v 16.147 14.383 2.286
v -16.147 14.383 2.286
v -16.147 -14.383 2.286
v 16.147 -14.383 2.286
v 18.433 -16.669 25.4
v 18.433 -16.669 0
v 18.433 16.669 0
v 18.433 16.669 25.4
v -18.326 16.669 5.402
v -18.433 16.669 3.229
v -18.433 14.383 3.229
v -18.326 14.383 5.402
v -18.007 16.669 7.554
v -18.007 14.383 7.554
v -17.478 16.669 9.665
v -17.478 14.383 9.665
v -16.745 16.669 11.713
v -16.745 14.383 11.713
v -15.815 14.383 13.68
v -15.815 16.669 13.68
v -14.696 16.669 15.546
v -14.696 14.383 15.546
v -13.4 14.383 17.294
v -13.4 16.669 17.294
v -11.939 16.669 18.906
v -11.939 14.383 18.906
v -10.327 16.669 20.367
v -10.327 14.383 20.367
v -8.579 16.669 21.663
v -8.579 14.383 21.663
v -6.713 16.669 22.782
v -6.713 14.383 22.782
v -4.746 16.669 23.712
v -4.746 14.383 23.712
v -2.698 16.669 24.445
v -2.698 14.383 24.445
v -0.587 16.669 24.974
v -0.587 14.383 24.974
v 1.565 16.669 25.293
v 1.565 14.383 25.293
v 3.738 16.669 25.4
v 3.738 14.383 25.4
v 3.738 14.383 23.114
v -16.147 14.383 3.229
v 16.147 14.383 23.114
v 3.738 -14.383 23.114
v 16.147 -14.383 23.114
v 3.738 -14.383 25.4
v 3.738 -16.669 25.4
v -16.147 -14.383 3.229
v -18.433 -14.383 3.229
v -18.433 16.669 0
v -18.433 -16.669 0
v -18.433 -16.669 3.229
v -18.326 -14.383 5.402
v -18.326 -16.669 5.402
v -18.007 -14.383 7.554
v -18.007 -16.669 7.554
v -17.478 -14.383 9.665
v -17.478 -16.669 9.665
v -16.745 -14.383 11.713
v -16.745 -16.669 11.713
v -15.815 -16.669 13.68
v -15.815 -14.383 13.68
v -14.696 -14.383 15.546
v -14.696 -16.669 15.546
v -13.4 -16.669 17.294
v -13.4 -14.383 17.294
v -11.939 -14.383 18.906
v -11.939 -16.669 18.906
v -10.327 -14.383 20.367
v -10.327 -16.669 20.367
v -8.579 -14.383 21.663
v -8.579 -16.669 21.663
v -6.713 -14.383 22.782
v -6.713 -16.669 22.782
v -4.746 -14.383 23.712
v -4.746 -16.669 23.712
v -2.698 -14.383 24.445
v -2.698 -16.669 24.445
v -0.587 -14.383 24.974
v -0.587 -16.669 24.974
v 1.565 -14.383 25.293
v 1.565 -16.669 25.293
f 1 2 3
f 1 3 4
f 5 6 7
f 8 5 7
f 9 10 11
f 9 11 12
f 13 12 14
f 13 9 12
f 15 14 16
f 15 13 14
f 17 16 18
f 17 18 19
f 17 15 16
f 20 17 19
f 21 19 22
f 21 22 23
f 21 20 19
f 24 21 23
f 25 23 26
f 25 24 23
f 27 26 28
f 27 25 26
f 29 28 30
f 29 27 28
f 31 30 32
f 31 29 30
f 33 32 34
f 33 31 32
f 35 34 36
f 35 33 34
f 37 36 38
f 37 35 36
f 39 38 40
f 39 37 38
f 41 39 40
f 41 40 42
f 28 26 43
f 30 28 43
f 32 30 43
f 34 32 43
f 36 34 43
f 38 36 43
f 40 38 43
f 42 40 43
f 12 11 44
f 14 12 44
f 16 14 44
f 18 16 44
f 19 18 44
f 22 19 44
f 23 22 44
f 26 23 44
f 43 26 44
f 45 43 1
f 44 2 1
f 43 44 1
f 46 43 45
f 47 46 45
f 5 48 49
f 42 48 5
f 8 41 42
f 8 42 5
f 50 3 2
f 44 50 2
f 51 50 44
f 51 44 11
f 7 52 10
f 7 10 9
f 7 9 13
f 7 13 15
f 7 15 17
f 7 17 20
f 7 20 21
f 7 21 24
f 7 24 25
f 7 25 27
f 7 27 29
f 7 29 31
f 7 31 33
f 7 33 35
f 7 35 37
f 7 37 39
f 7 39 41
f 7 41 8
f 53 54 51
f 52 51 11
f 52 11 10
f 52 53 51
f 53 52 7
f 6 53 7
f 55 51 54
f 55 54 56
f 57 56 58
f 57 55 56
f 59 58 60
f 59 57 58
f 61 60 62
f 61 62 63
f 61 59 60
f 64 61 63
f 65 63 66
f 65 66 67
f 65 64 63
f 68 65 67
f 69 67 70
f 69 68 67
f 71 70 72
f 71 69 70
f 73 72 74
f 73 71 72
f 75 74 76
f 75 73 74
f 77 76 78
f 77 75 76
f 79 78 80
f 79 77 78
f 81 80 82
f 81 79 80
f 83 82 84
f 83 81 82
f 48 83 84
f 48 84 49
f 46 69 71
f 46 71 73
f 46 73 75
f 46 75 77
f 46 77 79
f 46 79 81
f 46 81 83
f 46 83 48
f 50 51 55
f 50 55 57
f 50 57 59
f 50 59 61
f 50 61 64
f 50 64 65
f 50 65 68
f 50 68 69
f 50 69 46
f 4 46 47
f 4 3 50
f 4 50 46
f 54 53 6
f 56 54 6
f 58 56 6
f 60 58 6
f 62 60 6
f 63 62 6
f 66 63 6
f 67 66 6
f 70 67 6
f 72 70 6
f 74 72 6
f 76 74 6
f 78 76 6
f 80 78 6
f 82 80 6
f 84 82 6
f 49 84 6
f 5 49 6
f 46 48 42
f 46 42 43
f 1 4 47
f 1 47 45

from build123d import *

# Parameters (mm, degrees)
F0_W     = 36.8659496307
F0_H     = 33.33741799
F1_DEPTH = 25.4
F2_R     = 22.1712758518
F3_T     = 2.286


# Not quite as in the source:
# - a shell that OpenCascade refuses in one call is made with other operations: the cavity is built on its own and cut out


with BuildPart() as f1:
    # F0 (on Top) → F1 (new body)
    with BuildSketch(Plane.XY):
        Rectangle(F0_W, F0_H)
    extrude(amount=F1_DEPTH)

    # F2
    f2_edges = [f1.edges().sort_by_distance(p)[0] for p in [
        (-18.432975, 0, 25.4),
    ]]
    fillet(f2_edges, radius=F2_R)

    # F3: shell of thickness 2.286, made by hand


with BuildPart() as f3_core1:
    # F3_t2: copy of F1
    add(f1.part)

    # the walls: a layer under each face that stays
    f3_faces = [f3_core1.faces().sort_by_distance(p)[0] for p in [
        (0, 16.668708995, 12.7),
        (-18.4329748154, 0, 1.6143620741),
        (0, 0, 0),
        (11.0856379259, 0, 25.4),
        (18.4329748154, 0, 12.7),
        (0, -16.668708995, 12.7),
    ]]
    thicken(f3_faces, amount=-F3_T, mode=Mode.SUBTRACT)


with BuildPart() as f1_1:
    add(f1.part)

    # what is left inside the walls is the cavity
    f3_cavity = [f3_core1.part.solids().sort_by_distance(p)[0] for p in [
        (-11.922994, 4.794236, 18.890019),
    ]]
    add(f3_cavity, mode=Mode.SUBTRACT)


solid = f1_1.part
